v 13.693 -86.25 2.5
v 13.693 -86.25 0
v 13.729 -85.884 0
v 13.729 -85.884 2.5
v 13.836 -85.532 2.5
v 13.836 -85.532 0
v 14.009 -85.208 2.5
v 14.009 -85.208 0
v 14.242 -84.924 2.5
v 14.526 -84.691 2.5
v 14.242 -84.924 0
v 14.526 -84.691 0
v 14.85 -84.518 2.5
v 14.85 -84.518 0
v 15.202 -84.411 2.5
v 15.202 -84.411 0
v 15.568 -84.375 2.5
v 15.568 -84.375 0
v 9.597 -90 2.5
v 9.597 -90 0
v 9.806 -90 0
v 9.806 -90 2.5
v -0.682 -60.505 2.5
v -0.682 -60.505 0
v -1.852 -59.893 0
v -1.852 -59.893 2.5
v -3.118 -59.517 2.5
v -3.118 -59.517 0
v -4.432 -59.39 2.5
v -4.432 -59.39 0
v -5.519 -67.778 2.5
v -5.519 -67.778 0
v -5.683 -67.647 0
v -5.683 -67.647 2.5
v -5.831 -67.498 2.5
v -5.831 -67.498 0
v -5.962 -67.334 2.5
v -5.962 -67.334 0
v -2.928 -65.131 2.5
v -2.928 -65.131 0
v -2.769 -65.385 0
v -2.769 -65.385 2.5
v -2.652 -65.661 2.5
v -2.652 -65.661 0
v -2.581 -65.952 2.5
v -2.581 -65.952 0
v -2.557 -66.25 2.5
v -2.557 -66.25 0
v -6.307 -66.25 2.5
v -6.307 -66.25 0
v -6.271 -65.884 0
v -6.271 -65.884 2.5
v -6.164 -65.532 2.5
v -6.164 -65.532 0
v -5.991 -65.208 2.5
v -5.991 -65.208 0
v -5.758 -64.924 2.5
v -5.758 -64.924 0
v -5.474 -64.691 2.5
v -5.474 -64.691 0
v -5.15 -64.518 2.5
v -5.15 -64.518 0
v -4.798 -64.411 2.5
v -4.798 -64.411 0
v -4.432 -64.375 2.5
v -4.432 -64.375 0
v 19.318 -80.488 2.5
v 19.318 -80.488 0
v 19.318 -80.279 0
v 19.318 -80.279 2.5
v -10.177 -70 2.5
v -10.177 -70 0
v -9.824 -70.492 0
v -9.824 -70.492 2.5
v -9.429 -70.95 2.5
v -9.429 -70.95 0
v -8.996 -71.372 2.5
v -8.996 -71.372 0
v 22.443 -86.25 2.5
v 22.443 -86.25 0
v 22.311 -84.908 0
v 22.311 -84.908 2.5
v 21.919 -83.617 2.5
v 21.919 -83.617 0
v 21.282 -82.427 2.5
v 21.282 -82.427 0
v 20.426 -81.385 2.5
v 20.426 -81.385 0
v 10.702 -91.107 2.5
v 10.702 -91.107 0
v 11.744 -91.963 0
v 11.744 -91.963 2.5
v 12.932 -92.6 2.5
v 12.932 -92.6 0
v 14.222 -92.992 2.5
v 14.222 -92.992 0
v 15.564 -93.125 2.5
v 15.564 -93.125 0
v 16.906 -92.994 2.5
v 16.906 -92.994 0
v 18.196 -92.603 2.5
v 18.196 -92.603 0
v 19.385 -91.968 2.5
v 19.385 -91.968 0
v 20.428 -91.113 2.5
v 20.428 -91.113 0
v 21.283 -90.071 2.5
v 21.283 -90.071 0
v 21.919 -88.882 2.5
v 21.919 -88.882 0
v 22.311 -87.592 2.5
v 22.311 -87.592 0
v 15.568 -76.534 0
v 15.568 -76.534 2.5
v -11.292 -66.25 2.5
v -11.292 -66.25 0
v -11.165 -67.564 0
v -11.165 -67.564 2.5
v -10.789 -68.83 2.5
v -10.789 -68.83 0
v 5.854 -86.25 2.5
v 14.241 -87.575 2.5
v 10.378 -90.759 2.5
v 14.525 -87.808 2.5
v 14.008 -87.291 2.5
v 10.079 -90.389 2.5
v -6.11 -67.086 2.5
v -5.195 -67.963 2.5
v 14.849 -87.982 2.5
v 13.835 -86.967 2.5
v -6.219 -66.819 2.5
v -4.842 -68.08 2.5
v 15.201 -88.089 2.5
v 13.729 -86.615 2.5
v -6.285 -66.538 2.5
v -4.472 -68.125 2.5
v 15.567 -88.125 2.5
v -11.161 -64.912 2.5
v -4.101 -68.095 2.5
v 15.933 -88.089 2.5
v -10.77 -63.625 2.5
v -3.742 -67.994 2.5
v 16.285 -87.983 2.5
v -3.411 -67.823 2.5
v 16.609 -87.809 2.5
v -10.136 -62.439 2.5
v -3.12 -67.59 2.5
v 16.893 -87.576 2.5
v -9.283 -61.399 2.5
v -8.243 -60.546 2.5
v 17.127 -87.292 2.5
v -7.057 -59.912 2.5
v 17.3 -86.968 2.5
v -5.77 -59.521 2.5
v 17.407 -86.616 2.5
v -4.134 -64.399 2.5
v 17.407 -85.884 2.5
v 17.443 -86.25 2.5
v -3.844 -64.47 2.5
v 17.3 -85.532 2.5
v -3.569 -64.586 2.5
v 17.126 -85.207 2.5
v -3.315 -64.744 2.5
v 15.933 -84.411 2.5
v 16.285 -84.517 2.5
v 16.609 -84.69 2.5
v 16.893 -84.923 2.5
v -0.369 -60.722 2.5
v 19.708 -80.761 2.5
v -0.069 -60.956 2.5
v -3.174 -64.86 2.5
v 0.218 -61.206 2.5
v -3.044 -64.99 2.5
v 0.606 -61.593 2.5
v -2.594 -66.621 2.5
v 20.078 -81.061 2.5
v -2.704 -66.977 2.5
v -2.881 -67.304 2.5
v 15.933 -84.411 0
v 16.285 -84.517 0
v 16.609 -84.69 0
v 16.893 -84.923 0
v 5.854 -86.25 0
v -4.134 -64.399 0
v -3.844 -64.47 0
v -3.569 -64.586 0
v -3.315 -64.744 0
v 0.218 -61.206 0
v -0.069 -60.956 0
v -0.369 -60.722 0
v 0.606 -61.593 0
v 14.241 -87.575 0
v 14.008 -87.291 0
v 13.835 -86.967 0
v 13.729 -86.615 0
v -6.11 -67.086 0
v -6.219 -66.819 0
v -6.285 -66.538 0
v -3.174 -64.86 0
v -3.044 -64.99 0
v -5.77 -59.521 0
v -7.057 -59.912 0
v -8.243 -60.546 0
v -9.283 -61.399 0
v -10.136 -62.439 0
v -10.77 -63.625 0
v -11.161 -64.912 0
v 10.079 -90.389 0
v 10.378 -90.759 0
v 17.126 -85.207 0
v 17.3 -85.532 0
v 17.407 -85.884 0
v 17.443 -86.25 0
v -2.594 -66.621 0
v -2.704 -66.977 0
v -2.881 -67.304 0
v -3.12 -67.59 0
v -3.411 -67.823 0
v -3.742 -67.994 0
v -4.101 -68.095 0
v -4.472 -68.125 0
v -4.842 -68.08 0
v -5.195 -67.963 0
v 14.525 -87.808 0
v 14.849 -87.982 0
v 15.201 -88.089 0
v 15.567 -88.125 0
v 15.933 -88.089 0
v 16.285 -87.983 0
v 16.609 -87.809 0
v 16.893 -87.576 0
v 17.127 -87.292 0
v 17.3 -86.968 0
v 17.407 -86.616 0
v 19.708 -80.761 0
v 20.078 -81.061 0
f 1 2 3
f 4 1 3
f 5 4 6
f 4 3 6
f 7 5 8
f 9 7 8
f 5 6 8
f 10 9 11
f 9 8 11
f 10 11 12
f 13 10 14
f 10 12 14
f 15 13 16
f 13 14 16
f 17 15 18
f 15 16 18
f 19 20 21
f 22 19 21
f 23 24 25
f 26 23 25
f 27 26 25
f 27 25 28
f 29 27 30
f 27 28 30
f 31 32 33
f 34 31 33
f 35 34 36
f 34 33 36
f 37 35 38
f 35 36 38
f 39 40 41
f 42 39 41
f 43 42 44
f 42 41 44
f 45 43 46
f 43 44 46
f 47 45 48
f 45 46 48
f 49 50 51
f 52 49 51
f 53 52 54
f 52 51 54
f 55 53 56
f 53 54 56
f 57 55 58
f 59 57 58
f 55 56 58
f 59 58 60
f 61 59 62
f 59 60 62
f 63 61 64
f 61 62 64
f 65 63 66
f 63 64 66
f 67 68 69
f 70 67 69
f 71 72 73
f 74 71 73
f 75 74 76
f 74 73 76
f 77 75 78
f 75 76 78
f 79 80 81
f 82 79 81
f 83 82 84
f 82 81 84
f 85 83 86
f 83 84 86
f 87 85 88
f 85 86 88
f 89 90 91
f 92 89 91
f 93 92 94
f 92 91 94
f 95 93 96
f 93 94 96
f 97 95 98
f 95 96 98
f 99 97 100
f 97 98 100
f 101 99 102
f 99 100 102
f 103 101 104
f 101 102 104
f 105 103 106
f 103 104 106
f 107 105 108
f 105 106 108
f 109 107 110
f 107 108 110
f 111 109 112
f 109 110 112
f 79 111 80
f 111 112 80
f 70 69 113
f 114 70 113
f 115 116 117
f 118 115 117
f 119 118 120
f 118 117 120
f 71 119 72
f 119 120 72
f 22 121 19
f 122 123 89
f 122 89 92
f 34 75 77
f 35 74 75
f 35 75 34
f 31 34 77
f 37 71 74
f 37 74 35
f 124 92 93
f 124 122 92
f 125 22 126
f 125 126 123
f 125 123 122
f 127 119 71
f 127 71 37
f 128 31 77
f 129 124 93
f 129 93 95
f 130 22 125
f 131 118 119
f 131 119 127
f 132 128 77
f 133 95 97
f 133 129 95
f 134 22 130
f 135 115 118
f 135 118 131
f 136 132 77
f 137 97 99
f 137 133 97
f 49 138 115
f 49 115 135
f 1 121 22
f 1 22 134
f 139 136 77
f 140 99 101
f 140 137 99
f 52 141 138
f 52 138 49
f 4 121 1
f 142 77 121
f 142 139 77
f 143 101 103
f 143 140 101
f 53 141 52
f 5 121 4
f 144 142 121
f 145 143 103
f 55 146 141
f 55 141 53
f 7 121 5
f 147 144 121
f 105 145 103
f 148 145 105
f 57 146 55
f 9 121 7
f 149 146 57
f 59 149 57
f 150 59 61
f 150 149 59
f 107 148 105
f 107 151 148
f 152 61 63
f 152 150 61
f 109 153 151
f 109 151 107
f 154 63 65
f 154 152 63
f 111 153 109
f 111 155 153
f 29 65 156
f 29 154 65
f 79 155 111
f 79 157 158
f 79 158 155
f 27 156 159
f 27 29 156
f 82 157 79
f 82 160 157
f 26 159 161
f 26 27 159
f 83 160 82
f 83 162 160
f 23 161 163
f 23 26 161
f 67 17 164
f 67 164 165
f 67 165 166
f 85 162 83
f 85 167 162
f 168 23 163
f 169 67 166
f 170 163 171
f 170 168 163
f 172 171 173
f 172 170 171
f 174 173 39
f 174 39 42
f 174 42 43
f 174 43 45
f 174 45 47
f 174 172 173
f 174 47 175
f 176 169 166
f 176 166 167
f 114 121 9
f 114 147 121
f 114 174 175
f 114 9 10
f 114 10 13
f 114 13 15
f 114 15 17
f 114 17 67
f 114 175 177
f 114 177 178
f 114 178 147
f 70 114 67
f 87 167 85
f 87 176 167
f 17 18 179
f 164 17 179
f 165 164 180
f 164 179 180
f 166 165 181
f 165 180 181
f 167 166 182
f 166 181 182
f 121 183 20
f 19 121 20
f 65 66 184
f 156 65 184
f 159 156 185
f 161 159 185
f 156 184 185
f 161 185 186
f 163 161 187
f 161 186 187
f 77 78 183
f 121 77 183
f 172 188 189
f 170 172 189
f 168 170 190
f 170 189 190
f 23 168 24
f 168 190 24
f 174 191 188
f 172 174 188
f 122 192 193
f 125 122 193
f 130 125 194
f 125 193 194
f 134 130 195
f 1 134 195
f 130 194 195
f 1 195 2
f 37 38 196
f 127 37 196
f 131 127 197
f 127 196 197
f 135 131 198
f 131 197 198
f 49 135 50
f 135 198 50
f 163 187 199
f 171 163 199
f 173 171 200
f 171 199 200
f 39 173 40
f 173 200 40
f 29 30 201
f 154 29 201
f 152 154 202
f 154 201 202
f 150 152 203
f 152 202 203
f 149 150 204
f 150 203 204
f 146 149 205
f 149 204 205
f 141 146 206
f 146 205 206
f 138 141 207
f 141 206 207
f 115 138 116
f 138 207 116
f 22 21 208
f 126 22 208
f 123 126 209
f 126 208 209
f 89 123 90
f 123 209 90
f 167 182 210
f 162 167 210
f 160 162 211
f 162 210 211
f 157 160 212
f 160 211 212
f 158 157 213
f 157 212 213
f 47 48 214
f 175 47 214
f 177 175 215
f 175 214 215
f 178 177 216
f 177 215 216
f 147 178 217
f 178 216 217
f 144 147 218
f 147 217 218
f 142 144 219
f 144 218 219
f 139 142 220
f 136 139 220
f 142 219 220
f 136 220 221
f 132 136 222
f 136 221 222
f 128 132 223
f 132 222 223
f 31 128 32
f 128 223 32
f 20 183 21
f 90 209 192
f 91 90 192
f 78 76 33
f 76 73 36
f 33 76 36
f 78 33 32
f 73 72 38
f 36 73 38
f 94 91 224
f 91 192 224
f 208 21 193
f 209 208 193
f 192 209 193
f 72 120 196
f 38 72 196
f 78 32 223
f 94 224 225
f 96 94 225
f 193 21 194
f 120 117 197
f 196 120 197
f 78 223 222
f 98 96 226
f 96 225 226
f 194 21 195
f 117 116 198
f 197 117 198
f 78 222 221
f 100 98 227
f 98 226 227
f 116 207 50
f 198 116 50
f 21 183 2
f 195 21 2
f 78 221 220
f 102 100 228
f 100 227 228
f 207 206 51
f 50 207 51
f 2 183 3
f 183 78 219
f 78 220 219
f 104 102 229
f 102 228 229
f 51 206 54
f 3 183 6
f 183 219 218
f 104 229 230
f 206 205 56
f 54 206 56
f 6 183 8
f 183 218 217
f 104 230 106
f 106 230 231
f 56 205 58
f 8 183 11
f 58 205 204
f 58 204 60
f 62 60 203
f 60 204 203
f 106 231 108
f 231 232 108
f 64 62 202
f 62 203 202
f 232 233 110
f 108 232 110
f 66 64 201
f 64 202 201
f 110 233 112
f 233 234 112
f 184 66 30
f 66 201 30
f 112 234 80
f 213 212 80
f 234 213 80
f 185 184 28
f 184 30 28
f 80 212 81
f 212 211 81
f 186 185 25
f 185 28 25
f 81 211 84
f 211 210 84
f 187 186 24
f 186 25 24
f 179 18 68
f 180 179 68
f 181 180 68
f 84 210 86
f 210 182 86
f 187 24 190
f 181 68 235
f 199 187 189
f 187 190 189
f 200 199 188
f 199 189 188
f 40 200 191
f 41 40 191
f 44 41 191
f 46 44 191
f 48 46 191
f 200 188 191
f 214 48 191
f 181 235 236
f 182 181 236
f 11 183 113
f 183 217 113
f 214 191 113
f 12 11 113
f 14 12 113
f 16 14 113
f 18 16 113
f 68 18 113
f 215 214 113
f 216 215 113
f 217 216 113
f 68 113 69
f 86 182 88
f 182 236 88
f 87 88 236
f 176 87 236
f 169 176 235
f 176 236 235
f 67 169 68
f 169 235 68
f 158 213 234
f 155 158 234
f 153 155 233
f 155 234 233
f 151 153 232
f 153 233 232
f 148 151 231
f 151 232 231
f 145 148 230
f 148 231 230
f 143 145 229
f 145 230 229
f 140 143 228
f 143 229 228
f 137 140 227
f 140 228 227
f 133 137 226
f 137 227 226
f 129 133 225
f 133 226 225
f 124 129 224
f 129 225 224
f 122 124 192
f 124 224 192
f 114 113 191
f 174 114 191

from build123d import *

# Parameters (mm, degrees)
F1_DEPTH = 2.5


with BuildPart() as f1:
    # F0 (on Top) → F1 (new body)
    with BuildSketch(Plane.XY):
        with BuildLine():
            ThreePointArc((-4.432018362, -59.389646693), (-9.2830207067, -61.3989976553), (-11.2923716689, -66.25))
            Line((-11.2923716689, -66.25), (-6.307018362, -66.25))
            ThreePointArc((-6.307018362, -66.25), (-5.7578435767, -64.9241747853), (-4.432018362, -64.375))
            Line((-4.432018362, -64.375), (-4.432018362, -59.389646693))
        make_face()
        with BuildLine():
            ThreePointArc((-11.2923716689, -66.25), (-11.0075540706, -68.2062151314), (-10.1767505138, -70))
            Line((-10.1767505138, -70), (-3.300883806, -70))
            Line((-3.300883806, -70), (-5.5188745002, -67.7778641088))
            ThreePointArc((-5.5188745002, -67.7778641088), (-5.7590807574, -67.5745868785), (-5.961909132, -67.3340014907))
            ThreePointArc((-5.961909132, -67.3340014907), (-6.2186590917, -66.8188056813), (-6.307018362, -66.25))
            Line((-6.307018362, -66.25), (-11.2923716689, -66.25))
        make_face()
        with BuildLine():
            Line((-3.300883806, -70), (-10.1767505138, -70))
            ThreePointArc((-10.1767505138, -70), (-9.6316427271, -70.7253049011), (-8.9955877088, -71.3723317262))
            ThreePointArc((-8.9955877088, -71.3723317262), (-5.1719813551, -73.0703300701), (-1.073184401, -72.2318627466))
            Line((-1.073184401, -72.2318627466), (-3.300883806, -70))
        make_face()
        with BuildLine():
            Line((-5.5188745002, -67.7778641088), (-3.300883806, -70))
            Line((-3.300883806, -70), (-0.682018362, -70))
            Line((-0.682018362, -70), (-0.682018362, -67.3733334464))
            Line((-0.682018362, -67.3733334464), (-2.9275173343, -65.1310265161))
            ThreePointArc((-2.9275173343, -65.1310265161), (-2.6520514484, -65.6606420557), (-2.557018362, -66.25))
            ThreePointArc((-2.557018362, -66.25), (-3.5724342355, -67.9163553431), (-5.5188745002, -67.7778641088))
        make_face()
        with BuildLine():
            ThreePointArc((-0.682018362, -60.5052678482), (-2.4758032306, -59.6744642913), (-4.432018362, -59.389646693))
            Line((-4.432018362, -59.389646693), (-4.432018362, -64.375))
            ThreePointArc((-4.432018362, -64.375), (-3.8439266036, -64.4696143441), (-3.3151862223, -64.7439087107))
            ThreePointArc((-3.3151862223, -64.7439087107), (-3.1071365022, -64.9232321011), (-2.9275173343, -65.1310265161))
            Line((-2.9275173343, -65.1310265161), (-0.682018362, -67.3733334464))
            Line((-0.682018362, -67.3733334464), (-0.682018362, -60.5052678482))
        make_face()
        with BuildLine():
            Line((-0.682018362, -60.5052678482), (-0.682018362, -67.3733334464))
            Line((-0.682018362, -67.3733334464), (1.5522932658, -69.6044689353))
            ThreePointArc((1.5522932658, -69.6044689353), (2.2057124085, -67.9834871547), (2.428334945, -66.25))
            ThreePointArc((2.428334945, -66.25), (1.9563934061, -63.7494715403), (0.6055009602, -61.5929787873))
            Line((0.6055009602, -61.5929787873), (0.2178320688, -61.2058609786))
            ThreePointArc((0.2178320688, -61.2058609786), (-0.2175101465, -60.8368338287), (-0.682018362, -60.5052678482))
        make_face()
        with BuildLine():
            Line((-0.682018362, -70), (-3.300883806, -70))
            Line((-3.300883806, -70), (-1.073184401, -72.2318627466))
            ThreePointArc((-1.073184401, -72.2318627466), (0.4207532103, -71.0992324716), (1.5522932658, -69.6044689353))
            Line((1.5522932658, -69.6044689353), (-0.682018362, -67.3733334464))
            Line((-0.682018362, -67.3733334464), (-0.682018362, -70))
        make_face()
        with BuildLine():
            ThreePointArc((-1.073184401, -72.2318627466), (-5.1719813551, -73.0703300701), (-8.9955877088, -71.3723317262))
            Line((-8.9955877088, -71.3723317262), (5.8543275971, -86.25))
            Line((5.8543275971, -86.25), (8.692981638, -86.25))
            ThreePointArc((8.692981638, -86.25), (8.9153876284, -84.5154631906), (9.5682159488, -82.8931507817))
            Line((9.5682159488, -82.8931507817), (-1.073184401, -72.2318627466))
        make_face()
        with BuildLine():
            ThreePointArc((1.5522932658, -69.6044689353), (0.4207532103, -71.0992324716), (-1.073184401, -72.2318627466))
            Line((-1.073184401, -72.2318627466), (9.5682159488, -82.8931507817))
            ThreePointArc((9.5682159488, -82.8931507817), (10.7071629023, -81.3881005545), (12.2124662871, -80.249488211))
            Line((12.2124662871, -80.249488211), (1.5522932658, -69.6044689353))
        make_face()
        with BuildLine():
            ThreePointArc((2.428334945, -66.25), (2.2057124085, -67.9834871547), (1.5522932658, -69.6044689353))
            Line((1.5522932658, -69.6044689353), (12.2124662871, -80.249488211))
            ThreePointArc((12.2124662871, -80.249488211), (13.8341842954, -79.5972132324), (15.567981638, -79.375))
            Line((15.567981638, -79.375), (15.567981638, -76.5341898643))
            Line((15.567981638, -76.5341898643), (0.6055009602, -61.5929787873))
            ThreePointArc((0.6055009602, -61.5929787873), (1.9563934061, -63.7494715403), (2.428334945, -66.25))
        make_face()
        with BuildLine():
            ThreePointArc((15.567981638, -79.375), (13.8341842954, -79.5972132324), (12.2124662871, -80.249488211))
            Line((12.2124662871, -80.249488211), (15.567981638, -83.6002335993))
            Line((15.567981638, -83.6002335993), (15.567981638, -79.375))
        make_face()
        with BuildLine():
            ThreePointArc((12.2124662871, -80.249488211), (10.7071629023, -81.3881005545), (9.5682159488, -82.8931507817))
            Line((9.5682159488, -82.8931507817), (12.9188032632, -86.25))
            Line((12.9188032632, -86.25), (13.692981638, -86.25))
            ThreePointArc((13.692981638, -86.25), (14.2421564233, -84.9241747853), (15.567981638, -84.375))
            Line((15.567981638, -84.375), (15.567981638, -83.6002335993))
            Line((15.567981638, -83.6002335993), (12.2124662871, -80.249488211))
        make_face()
        with BuildLine():
            Line((12.9188032632, -86.25), (9.5682159488, -82.8931507817))
            ThreePointArc((9.5682159488, -82.8931507817), (8.9153876284, -84.5154631906), (8.692981638, -86.25))
            Line((8.692981638, -86.25), (12.9188032632, -86.25))
        make_face()
        with BuildLine():
            Line((8.692981638, -86.25), (5.8543275971, -86.25))
            Line((5.8543275971, -86.25), (9.5973323053, -90))
            Line((9.5973323053, -90), (9.8057663522, -90))
            ThreePointArc((9.8057663522, -90), (8.9770463823, -88.2058112013), (8.692981638, -86.25))
        make_face()
        with BuildLine():
            Line((15.567981638, -76.5341898643), (15.567981638, -79.375))
            ThreePointArc((15.567981638, -79.375), (17.5237928393, -79.6590647443), (19.317981638, -80.4877847142))
            Line((19.317981638, -80.4877847142), (19.317981638, -80.2788591303))
            Line((19.317981638, -80.2788591303), (15.567981638, -76.5341898643))
        make_face()
        with BuildLine():
            Line((13.692981638, -86.25), (12.9188032632, -86.25))
            Line((12.9188032632, -86.25), (14.2409192426, -87.5745868785))
            ThreePointArc((14.2409192426, -87.5745868785), (13.8353727682, -86.9667227527), (13.692981638, -86.25))
        make_face()
        with BuildLine():
            Line((16.8928634978, -84.9232321011), (15.567981638, -83.6002335993))
            Line((15.567981638, -83.6002335993), (15.567981638, -84.375))
            ThreePointArc((15.567981638, -84.375), (16.2848969711, -84.5174708068), (16.8928634978, -84.9232321011))
        make_face()
        with BuildLine():
            Line((12.9188032632, -86.25), (8.692981638, -86.25))
            ThreePointArc((8.692981638, -86.25), (8.9770463823, -88.2058112013), (9.8057663522, -90))
            Line((9.8057663522, -90), (19.317981638, -90))
            Line((19.317981638, -90), (19.317981638, -80.4877847142))
            ThreePointArc((19.317981638, -80.4877847142), (17.5237928393, -79.6590647443), (15.567981638, -79.375))
            Line((15.567981638, -79.375), (15.567981638, -83.6002335993))
            Line((15.567981638, -83.6002335993), (16.8928634978, -84.9232321011))
            ThreePointArc((16.8928634978, -84.9232321011), (17.3000004727, -85.5318525524), (17.442981638, -86.25))
            ThreePointArc((17.442981638, -86.25), (16.2847043907, -87.9826088698), (14.2409192426, -87.5745868785))
            Line((14.2409192426, -87.5745868785), (12.9188032632, -86.25))
        make_face()
        with BuildLine():
            Line((19.317981638, -90), (9.8057663522, -90))
            ThreePointArc((9.8057663522, -90), (10.2251877733, -90.5766821837), (10.7020861881, -91.1068185544))
            ThreePointArc((10.7020861881, -91.1068185544), (18.1959650647, -92.6028991893), (22.442981638, -86.25))
            ThreePointArc((22.442981638, -86.25), (21.9187173646, -83.6167926912), (20.4258817889, -81.385184369))
            ThreePointArc((20.4258817889, -81.385184369), (19.8952576619, -80.9076870915), (19.317981638, -80.4877847142))
            Line((19.317981638, -80.4877847142), (19.317981638, -90))
        make_face()
    extrude(amount=F1_DEPTH)


solid = f1.part
